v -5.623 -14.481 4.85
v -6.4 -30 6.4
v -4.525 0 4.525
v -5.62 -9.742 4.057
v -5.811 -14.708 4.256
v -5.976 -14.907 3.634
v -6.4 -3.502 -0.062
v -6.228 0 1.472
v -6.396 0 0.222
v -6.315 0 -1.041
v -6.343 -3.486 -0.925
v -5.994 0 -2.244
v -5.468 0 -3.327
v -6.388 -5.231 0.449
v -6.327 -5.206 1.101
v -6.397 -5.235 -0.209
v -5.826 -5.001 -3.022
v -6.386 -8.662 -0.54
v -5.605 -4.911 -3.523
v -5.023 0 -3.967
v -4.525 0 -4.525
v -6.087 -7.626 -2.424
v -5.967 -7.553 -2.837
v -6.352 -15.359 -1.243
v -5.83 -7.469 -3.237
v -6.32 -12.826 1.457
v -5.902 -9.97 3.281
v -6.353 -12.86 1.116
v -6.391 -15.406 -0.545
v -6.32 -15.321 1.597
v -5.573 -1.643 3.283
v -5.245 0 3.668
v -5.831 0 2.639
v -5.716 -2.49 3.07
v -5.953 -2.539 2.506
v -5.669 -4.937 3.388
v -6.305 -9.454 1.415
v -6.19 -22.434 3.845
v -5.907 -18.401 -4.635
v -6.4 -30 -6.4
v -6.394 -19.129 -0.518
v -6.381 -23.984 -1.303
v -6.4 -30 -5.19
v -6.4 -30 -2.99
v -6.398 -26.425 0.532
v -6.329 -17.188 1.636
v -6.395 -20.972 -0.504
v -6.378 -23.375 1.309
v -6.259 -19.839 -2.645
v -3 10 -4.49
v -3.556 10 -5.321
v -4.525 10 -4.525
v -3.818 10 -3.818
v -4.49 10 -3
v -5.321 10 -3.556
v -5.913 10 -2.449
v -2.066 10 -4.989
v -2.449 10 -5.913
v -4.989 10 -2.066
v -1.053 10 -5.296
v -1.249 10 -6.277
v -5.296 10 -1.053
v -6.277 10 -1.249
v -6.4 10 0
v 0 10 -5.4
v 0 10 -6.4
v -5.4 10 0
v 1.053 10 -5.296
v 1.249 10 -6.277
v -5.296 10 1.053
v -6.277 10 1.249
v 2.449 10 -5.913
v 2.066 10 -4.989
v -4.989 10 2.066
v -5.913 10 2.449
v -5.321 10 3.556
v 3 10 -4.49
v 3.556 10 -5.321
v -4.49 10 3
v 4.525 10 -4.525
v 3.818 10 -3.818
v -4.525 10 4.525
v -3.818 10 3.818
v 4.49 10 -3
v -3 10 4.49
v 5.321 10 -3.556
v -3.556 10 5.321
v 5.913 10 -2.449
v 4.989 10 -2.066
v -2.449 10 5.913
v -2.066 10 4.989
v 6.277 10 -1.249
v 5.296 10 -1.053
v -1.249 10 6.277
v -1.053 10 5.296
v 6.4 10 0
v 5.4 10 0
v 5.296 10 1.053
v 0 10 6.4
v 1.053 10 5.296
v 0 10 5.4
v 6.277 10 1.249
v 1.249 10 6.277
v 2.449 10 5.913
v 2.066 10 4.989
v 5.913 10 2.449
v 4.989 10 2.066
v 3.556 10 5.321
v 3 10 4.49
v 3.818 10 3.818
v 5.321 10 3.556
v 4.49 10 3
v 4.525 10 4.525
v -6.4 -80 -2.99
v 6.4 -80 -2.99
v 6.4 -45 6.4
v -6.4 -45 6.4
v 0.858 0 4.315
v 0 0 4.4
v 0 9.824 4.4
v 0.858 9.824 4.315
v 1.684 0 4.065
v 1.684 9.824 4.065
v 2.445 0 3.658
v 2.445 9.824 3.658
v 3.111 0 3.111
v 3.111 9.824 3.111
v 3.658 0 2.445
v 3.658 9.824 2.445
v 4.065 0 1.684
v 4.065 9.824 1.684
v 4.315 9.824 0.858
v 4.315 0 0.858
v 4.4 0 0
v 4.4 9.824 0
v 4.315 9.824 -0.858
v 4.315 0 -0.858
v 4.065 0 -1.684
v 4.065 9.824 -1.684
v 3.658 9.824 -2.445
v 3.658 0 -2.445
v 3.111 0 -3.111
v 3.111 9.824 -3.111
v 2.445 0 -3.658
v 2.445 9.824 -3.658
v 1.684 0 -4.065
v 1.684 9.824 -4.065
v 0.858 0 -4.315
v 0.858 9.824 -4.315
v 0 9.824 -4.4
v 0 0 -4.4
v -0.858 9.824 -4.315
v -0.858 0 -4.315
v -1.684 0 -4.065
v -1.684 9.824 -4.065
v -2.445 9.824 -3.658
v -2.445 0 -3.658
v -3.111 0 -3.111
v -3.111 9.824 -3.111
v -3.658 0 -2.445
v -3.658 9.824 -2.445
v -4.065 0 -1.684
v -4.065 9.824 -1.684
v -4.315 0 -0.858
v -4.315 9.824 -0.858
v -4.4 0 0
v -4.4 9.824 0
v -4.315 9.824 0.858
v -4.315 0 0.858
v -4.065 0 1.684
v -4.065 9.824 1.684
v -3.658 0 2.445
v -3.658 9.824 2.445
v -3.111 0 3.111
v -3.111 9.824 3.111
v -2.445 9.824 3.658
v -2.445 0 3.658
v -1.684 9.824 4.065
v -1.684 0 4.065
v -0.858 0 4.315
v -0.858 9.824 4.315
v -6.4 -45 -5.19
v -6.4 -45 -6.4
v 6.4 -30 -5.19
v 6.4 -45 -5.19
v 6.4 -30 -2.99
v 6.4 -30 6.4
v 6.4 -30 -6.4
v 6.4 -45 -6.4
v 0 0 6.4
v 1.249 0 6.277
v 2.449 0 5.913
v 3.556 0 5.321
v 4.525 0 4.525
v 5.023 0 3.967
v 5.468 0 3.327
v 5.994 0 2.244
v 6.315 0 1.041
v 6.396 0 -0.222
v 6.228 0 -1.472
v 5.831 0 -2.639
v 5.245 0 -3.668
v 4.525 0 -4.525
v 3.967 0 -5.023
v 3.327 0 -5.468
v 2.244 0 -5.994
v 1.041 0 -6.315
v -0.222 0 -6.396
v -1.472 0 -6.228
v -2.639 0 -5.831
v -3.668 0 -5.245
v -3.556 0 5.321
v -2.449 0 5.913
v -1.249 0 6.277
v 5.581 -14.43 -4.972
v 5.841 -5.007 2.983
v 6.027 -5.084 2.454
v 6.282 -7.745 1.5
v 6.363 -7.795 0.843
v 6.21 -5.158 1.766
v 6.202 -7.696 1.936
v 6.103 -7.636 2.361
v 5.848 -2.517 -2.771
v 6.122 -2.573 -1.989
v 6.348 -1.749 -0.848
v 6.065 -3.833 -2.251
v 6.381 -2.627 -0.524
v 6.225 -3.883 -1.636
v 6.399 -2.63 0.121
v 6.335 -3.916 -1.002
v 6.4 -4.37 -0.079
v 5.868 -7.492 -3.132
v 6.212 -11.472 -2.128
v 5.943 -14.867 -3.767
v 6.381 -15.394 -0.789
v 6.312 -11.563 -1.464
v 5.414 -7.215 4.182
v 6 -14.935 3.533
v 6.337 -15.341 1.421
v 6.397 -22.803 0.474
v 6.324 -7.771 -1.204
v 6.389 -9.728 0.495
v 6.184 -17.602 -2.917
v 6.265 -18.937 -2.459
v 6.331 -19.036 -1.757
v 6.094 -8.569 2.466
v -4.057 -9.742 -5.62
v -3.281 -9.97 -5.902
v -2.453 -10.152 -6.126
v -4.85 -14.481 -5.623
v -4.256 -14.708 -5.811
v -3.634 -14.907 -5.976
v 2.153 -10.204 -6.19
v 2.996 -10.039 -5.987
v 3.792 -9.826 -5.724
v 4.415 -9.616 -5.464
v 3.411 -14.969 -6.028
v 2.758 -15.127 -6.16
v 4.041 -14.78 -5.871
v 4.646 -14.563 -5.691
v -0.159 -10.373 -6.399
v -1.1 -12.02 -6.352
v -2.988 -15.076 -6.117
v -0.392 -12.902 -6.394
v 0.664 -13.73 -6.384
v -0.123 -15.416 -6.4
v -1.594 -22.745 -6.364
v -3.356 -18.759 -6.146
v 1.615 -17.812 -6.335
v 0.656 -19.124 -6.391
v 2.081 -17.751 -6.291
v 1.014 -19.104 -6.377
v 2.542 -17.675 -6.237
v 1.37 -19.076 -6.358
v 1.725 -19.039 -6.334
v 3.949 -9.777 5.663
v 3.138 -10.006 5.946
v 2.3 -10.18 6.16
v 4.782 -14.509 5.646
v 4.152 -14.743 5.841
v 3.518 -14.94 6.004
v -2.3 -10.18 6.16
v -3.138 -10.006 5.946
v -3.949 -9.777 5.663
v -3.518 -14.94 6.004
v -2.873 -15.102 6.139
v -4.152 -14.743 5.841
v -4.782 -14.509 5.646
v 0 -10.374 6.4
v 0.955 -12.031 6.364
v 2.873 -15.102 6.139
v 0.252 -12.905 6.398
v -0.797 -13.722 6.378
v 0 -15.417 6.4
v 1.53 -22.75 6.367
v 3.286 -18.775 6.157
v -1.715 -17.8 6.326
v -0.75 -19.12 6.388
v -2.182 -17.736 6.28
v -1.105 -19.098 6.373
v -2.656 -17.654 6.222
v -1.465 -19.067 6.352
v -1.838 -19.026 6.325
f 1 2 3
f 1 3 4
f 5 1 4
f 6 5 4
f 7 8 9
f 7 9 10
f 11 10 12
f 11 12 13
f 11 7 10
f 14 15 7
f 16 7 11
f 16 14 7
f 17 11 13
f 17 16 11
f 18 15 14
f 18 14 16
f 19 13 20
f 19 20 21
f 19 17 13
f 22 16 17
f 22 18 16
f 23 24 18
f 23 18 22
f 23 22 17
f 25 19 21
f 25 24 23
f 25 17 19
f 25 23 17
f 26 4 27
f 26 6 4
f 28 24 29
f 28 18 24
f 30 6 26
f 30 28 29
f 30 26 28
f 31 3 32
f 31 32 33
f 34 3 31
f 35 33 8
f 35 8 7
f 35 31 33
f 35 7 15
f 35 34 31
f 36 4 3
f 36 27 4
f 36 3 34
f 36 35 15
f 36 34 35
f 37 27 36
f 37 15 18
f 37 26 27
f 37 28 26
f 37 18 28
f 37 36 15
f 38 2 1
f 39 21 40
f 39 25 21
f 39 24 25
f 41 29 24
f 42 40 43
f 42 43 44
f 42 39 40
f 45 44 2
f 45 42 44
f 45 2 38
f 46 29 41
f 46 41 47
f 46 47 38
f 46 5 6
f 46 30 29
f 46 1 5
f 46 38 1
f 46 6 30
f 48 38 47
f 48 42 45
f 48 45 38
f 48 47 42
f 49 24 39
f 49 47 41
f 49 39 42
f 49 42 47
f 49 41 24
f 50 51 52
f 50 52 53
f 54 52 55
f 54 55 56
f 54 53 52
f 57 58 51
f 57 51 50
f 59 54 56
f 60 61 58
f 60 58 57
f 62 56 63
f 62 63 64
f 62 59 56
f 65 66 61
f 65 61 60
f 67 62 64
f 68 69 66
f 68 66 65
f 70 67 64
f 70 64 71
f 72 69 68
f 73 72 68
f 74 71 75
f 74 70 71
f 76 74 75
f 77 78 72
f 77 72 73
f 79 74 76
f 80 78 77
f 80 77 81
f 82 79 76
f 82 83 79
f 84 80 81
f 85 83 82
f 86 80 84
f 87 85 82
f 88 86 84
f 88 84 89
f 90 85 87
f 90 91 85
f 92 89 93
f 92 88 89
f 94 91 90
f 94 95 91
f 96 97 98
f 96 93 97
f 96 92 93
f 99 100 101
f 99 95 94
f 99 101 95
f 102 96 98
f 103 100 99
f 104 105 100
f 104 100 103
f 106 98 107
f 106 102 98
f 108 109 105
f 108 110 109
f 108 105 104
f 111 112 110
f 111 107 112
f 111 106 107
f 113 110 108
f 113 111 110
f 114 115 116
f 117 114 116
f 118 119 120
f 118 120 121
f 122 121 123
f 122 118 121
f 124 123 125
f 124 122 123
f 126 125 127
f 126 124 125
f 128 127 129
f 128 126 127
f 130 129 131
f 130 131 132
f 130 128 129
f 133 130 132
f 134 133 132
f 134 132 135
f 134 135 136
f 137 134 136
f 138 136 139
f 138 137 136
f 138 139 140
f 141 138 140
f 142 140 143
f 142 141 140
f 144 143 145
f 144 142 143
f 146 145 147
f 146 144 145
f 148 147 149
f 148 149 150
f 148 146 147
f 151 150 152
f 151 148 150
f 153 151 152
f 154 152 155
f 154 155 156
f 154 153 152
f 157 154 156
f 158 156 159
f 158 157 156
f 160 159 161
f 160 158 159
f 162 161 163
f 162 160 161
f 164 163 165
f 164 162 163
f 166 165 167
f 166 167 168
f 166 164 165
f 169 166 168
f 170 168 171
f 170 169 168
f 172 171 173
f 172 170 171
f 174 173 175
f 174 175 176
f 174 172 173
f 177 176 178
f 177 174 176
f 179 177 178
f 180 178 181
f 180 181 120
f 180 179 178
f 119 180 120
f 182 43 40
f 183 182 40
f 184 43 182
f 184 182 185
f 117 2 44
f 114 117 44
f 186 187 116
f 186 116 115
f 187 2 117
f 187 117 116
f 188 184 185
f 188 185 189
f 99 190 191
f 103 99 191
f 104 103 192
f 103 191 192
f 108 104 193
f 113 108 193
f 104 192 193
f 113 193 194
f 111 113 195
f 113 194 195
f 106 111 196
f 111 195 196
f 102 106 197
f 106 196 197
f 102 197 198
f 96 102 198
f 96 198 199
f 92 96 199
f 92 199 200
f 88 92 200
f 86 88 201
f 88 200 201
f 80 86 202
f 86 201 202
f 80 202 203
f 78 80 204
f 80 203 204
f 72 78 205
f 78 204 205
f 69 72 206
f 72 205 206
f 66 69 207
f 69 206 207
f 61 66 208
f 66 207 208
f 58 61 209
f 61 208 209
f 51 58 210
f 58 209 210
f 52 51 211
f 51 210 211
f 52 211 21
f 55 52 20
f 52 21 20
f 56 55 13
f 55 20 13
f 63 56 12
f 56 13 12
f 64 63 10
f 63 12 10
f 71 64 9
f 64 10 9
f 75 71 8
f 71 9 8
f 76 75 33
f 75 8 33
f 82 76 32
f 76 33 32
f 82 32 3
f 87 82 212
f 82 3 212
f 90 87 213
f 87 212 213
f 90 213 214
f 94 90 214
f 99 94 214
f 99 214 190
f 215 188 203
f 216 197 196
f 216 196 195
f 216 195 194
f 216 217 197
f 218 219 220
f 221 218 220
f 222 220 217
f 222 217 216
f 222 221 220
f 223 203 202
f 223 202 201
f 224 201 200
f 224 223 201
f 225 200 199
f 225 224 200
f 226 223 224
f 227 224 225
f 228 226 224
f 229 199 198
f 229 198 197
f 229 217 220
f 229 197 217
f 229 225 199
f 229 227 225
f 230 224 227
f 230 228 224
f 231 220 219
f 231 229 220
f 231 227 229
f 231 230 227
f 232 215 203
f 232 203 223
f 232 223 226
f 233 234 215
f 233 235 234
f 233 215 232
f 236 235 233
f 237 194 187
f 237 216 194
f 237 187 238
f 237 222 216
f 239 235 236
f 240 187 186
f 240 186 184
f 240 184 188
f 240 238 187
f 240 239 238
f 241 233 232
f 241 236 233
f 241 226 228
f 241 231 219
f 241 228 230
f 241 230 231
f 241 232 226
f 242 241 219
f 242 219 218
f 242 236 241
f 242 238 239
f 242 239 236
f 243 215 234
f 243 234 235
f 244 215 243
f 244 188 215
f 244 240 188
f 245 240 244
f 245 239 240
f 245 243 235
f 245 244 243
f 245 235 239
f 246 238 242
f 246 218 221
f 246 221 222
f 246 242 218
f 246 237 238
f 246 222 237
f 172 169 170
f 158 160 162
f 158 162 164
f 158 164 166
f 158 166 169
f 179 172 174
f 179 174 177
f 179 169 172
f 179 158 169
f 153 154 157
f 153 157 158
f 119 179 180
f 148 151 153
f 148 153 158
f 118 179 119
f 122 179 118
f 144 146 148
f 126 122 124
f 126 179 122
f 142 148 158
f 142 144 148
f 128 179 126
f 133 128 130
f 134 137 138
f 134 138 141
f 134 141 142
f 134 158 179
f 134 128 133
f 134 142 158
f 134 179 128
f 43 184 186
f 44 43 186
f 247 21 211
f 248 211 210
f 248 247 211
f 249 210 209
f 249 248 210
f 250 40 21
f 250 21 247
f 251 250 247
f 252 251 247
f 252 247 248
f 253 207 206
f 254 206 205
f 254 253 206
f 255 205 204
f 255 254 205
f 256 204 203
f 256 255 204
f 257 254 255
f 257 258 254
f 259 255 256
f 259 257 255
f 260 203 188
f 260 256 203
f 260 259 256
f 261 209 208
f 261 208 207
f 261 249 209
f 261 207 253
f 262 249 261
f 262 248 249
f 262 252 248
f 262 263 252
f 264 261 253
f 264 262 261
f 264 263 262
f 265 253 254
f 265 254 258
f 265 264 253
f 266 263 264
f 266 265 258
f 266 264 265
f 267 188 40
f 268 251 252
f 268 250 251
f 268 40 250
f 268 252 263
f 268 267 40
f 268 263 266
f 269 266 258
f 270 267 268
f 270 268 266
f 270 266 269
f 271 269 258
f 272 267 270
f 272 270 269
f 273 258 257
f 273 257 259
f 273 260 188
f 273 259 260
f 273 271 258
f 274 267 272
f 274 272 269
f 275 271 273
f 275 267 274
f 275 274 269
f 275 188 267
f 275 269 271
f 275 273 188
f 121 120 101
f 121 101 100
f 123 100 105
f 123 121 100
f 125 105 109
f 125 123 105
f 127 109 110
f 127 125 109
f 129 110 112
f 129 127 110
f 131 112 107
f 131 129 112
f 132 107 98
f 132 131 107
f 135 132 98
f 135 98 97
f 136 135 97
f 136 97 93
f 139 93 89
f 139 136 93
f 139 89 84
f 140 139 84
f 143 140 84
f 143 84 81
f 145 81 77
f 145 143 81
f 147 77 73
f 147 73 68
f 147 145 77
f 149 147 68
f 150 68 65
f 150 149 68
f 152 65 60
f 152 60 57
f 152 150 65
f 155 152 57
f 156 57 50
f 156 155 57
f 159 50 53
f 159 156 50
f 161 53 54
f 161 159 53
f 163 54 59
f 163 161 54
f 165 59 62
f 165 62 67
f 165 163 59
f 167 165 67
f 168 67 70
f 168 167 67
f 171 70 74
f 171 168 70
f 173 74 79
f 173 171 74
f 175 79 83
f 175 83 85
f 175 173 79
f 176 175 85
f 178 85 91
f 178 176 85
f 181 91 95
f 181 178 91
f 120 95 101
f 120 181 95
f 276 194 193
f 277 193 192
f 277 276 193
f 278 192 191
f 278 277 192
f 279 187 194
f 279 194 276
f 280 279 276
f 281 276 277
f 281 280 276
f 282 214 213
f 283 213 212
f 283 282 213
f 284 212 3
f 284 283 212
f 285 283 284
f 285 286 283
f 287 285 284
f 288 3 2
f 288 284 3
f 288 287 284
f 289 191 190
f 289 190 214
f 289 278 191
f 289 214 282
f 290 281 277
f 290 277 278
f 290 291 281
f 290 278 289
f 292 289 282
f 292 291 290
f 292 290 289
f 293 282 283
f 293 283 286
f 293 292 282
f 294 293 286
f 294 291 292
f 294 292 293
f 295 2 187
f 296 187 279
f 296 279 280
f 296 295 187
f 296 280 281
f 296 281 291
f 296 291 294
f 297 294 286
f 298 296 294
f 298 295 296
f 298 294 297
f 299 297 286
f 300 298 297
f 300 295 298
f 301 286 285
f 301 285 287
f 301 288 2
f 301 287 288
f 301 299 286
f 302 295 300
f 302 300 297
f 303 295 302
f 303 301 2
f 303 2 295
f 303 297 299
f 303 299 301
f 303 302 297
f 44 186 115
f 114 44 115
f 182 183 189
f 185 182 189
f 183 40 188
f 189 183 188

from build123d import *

# Parameters (mm, degrees)
SKETCH1_R                       = 6.4
SKETCH1_R_2                     = 4.4
BOSS_EXTRUDE1_DEPTH             = 10
CHAMFER1_SIZE                   = 1
CHAMFER1_SIZE2                  = 0.176326981
BOSS_EXTRUDE2_START             = -30
SKETCH4_W                       = 12.8
SKETCH4_H                       = 9.39
SKETCH4_H_2                     = 1.21
BOSS_EXTRUDE2_DEPTH             = 15
BOSS_EXTRUDE3_REACH             = 47.901
BOSS_EXTRUDE3_DIRECTION_2_REACH = 47.901


with BuildPart() as part:
    # Sketch1 → Boss-Extrude1 (new body)
    with BuildSketch(Plane(origin=(0, 0, 0), x_dir=(1, 0, 0), z_dir=(0, 1, 0))):
        with Locations(Location((0, 0, 0), (0, 0, 270))):
            Circle(SKETCH1_R)
        with Locations(Location((0, 0, 0), (0, 0, 270))):
            Circle(SKETCH1_R_2, mode=Mode.SUBTRACT)
    extrude(amount=BOSS_EXTRUDE1_DEPTH)

    # Chamfer1
    chamfer1_edges = [part.edges().sort_by_distance(p)[0] for p in [
        (0, 10, -4.4),
    ]]
    chamfer1_side = [part.faces().sort_by_distance(p)[0] for p in [
        (0, 10, -6.218980664),
    ]]
    chamfer(chamfer1_edges, length=CHAMFER1_SIZE, length2=CHAMFER1_SIZE2, reference=chamfer1_side[0])

    # Sketch2 for Loft1 → Loft1 section 0
    with BuildSketch(Plane.XZ):
        with BuildLine():
            # circular arc as an exact rational Bezier (weights 1, cos(half-angle), 1)
            Bezier((-4.5254834, -4.5254834), (0, -9.050966798), (4.5254834, -4.5254834), weights=[1, 0.707106781, 1])
            Bezier((4.5254834, -4.5254834), (9.050966798, 0), (4.5254834, 4.5254834), weights=[1, 0.707106781, 1])
            Bezier((4.5254834, 4.5254834), (0, 9.050966798), (-4.5254834, 4.5254834), weights=[1, 0.707106781, 1])
            Bezier((-4.5254834, 4.5254834), (-9.050966798, 0), (-4.5254834, -4.5254834), weights=[1, 0.707106781, 1])
        make_face()
    # Sketch3 → Loft1 section 1
    with BuildSketch(Plane(origin=(0, -30, 0), x_dir=(-1, 0, 0), z_dir=(0, -1, 0))):
        with BuildLine():
            Line((6.4, 6.4), (-6.4, 6.4))
            Line((-6.4, 6.4), (-6.4, -6.4))
            Line((-6.4, -6.4), (6.4, -6.4))
            Line((6.4, -6.4), (6.4, 6.4))
        make_face()
    loft()

    # Sketch4 → Boss-Extrude2 (add)
    with BuildSketch(Plane(origin=(0, 0, 0), x_dir=(1, 0, 0), z_dir=(0, 1, 0)).offset(BOSS_EXTRUDE2_START)):
        with Locations((0, -1.705)):
            Rectangle(SKETCH4_W, SKETCH4_H)
        with Locations((0, 5.795)):
            Rectangle(SKETCH4_W, SKETCH4_H_2)
    extrude(amount=-BOSS_EXTRUDE2_DEPTH)

    # Boss-Extrude3: up to this face of the body (flat: up to its plane)
    boss_extrude3_end = Plane(part.part.faces().sort_by_distance((6.4, -37.5, 1.705))[0])
    # Sketch5 → Boss-Extrude3 (add, up to the picked face)
    with BuildSketch(Plane(origin=(0, 0, 0), x_dir=(0, 0, -1), z_dir=(1, 0, 0)), mode=Mode.PRIVATE) as boss_extrude3_sk1:
        Polygon((2.99, -45), (2.99, -80), (-6.4, -45), align=None)
    boss_extrude3_tool1 = split(extrude(boss_extrude3_sk1.sketch, amount=BOSS_EXTRUDE3_REACH, mode=Mode.PRIVATE), bisect_by=boss_extrude3_end, keep=Keep.BOTH, mode=Mode.PRIVATE)
    add(boss_extrude3_tool1.solids().sort_by(Axis((0, -56.666667, 0.14), (1, 0, 0)))[0])

    # Boss-Extrude3 direction 2: up to this face of the body (flat: up to its plane)
    boss_extrude3_direction_2_end = Plane(part.part.faces().sort_by_distance((-6.4, -37.5, 1.705))[0])
    # Sketch5 → Boss-Extrude3 direction 2 (add, up to the picked face)
    with BuildSketch(Plane(origin=(0, 0, 0), x_dir=(0, 0, -1), z_dir=(1, 0, 0)), mode=Mode.PRIVATE) as boss_extrude3_direction_2_sk1:
        Polygon((2.99, -45), (2.99, -80), (-6.4, -45), align=None)
    boss_extrude3_direction_2_tool1 = split(extrude(boss_extrude3_direction_2_sk1.sketch, amount=-BOSS_EXTRUDE3_DIRECTION_2_REACH, mode=Mode.PRIVATE), bisect_by=boss_extrude3_direction_2_end, keep=Keep.BOTH, mode=Mode.PRIVATE)
    add(boss_extrude3_direction_2_tool1.solids().sort_by(Axis((0, -56.666667, 0.14), (-1, 0, 0)))[0])


solid = part.part
